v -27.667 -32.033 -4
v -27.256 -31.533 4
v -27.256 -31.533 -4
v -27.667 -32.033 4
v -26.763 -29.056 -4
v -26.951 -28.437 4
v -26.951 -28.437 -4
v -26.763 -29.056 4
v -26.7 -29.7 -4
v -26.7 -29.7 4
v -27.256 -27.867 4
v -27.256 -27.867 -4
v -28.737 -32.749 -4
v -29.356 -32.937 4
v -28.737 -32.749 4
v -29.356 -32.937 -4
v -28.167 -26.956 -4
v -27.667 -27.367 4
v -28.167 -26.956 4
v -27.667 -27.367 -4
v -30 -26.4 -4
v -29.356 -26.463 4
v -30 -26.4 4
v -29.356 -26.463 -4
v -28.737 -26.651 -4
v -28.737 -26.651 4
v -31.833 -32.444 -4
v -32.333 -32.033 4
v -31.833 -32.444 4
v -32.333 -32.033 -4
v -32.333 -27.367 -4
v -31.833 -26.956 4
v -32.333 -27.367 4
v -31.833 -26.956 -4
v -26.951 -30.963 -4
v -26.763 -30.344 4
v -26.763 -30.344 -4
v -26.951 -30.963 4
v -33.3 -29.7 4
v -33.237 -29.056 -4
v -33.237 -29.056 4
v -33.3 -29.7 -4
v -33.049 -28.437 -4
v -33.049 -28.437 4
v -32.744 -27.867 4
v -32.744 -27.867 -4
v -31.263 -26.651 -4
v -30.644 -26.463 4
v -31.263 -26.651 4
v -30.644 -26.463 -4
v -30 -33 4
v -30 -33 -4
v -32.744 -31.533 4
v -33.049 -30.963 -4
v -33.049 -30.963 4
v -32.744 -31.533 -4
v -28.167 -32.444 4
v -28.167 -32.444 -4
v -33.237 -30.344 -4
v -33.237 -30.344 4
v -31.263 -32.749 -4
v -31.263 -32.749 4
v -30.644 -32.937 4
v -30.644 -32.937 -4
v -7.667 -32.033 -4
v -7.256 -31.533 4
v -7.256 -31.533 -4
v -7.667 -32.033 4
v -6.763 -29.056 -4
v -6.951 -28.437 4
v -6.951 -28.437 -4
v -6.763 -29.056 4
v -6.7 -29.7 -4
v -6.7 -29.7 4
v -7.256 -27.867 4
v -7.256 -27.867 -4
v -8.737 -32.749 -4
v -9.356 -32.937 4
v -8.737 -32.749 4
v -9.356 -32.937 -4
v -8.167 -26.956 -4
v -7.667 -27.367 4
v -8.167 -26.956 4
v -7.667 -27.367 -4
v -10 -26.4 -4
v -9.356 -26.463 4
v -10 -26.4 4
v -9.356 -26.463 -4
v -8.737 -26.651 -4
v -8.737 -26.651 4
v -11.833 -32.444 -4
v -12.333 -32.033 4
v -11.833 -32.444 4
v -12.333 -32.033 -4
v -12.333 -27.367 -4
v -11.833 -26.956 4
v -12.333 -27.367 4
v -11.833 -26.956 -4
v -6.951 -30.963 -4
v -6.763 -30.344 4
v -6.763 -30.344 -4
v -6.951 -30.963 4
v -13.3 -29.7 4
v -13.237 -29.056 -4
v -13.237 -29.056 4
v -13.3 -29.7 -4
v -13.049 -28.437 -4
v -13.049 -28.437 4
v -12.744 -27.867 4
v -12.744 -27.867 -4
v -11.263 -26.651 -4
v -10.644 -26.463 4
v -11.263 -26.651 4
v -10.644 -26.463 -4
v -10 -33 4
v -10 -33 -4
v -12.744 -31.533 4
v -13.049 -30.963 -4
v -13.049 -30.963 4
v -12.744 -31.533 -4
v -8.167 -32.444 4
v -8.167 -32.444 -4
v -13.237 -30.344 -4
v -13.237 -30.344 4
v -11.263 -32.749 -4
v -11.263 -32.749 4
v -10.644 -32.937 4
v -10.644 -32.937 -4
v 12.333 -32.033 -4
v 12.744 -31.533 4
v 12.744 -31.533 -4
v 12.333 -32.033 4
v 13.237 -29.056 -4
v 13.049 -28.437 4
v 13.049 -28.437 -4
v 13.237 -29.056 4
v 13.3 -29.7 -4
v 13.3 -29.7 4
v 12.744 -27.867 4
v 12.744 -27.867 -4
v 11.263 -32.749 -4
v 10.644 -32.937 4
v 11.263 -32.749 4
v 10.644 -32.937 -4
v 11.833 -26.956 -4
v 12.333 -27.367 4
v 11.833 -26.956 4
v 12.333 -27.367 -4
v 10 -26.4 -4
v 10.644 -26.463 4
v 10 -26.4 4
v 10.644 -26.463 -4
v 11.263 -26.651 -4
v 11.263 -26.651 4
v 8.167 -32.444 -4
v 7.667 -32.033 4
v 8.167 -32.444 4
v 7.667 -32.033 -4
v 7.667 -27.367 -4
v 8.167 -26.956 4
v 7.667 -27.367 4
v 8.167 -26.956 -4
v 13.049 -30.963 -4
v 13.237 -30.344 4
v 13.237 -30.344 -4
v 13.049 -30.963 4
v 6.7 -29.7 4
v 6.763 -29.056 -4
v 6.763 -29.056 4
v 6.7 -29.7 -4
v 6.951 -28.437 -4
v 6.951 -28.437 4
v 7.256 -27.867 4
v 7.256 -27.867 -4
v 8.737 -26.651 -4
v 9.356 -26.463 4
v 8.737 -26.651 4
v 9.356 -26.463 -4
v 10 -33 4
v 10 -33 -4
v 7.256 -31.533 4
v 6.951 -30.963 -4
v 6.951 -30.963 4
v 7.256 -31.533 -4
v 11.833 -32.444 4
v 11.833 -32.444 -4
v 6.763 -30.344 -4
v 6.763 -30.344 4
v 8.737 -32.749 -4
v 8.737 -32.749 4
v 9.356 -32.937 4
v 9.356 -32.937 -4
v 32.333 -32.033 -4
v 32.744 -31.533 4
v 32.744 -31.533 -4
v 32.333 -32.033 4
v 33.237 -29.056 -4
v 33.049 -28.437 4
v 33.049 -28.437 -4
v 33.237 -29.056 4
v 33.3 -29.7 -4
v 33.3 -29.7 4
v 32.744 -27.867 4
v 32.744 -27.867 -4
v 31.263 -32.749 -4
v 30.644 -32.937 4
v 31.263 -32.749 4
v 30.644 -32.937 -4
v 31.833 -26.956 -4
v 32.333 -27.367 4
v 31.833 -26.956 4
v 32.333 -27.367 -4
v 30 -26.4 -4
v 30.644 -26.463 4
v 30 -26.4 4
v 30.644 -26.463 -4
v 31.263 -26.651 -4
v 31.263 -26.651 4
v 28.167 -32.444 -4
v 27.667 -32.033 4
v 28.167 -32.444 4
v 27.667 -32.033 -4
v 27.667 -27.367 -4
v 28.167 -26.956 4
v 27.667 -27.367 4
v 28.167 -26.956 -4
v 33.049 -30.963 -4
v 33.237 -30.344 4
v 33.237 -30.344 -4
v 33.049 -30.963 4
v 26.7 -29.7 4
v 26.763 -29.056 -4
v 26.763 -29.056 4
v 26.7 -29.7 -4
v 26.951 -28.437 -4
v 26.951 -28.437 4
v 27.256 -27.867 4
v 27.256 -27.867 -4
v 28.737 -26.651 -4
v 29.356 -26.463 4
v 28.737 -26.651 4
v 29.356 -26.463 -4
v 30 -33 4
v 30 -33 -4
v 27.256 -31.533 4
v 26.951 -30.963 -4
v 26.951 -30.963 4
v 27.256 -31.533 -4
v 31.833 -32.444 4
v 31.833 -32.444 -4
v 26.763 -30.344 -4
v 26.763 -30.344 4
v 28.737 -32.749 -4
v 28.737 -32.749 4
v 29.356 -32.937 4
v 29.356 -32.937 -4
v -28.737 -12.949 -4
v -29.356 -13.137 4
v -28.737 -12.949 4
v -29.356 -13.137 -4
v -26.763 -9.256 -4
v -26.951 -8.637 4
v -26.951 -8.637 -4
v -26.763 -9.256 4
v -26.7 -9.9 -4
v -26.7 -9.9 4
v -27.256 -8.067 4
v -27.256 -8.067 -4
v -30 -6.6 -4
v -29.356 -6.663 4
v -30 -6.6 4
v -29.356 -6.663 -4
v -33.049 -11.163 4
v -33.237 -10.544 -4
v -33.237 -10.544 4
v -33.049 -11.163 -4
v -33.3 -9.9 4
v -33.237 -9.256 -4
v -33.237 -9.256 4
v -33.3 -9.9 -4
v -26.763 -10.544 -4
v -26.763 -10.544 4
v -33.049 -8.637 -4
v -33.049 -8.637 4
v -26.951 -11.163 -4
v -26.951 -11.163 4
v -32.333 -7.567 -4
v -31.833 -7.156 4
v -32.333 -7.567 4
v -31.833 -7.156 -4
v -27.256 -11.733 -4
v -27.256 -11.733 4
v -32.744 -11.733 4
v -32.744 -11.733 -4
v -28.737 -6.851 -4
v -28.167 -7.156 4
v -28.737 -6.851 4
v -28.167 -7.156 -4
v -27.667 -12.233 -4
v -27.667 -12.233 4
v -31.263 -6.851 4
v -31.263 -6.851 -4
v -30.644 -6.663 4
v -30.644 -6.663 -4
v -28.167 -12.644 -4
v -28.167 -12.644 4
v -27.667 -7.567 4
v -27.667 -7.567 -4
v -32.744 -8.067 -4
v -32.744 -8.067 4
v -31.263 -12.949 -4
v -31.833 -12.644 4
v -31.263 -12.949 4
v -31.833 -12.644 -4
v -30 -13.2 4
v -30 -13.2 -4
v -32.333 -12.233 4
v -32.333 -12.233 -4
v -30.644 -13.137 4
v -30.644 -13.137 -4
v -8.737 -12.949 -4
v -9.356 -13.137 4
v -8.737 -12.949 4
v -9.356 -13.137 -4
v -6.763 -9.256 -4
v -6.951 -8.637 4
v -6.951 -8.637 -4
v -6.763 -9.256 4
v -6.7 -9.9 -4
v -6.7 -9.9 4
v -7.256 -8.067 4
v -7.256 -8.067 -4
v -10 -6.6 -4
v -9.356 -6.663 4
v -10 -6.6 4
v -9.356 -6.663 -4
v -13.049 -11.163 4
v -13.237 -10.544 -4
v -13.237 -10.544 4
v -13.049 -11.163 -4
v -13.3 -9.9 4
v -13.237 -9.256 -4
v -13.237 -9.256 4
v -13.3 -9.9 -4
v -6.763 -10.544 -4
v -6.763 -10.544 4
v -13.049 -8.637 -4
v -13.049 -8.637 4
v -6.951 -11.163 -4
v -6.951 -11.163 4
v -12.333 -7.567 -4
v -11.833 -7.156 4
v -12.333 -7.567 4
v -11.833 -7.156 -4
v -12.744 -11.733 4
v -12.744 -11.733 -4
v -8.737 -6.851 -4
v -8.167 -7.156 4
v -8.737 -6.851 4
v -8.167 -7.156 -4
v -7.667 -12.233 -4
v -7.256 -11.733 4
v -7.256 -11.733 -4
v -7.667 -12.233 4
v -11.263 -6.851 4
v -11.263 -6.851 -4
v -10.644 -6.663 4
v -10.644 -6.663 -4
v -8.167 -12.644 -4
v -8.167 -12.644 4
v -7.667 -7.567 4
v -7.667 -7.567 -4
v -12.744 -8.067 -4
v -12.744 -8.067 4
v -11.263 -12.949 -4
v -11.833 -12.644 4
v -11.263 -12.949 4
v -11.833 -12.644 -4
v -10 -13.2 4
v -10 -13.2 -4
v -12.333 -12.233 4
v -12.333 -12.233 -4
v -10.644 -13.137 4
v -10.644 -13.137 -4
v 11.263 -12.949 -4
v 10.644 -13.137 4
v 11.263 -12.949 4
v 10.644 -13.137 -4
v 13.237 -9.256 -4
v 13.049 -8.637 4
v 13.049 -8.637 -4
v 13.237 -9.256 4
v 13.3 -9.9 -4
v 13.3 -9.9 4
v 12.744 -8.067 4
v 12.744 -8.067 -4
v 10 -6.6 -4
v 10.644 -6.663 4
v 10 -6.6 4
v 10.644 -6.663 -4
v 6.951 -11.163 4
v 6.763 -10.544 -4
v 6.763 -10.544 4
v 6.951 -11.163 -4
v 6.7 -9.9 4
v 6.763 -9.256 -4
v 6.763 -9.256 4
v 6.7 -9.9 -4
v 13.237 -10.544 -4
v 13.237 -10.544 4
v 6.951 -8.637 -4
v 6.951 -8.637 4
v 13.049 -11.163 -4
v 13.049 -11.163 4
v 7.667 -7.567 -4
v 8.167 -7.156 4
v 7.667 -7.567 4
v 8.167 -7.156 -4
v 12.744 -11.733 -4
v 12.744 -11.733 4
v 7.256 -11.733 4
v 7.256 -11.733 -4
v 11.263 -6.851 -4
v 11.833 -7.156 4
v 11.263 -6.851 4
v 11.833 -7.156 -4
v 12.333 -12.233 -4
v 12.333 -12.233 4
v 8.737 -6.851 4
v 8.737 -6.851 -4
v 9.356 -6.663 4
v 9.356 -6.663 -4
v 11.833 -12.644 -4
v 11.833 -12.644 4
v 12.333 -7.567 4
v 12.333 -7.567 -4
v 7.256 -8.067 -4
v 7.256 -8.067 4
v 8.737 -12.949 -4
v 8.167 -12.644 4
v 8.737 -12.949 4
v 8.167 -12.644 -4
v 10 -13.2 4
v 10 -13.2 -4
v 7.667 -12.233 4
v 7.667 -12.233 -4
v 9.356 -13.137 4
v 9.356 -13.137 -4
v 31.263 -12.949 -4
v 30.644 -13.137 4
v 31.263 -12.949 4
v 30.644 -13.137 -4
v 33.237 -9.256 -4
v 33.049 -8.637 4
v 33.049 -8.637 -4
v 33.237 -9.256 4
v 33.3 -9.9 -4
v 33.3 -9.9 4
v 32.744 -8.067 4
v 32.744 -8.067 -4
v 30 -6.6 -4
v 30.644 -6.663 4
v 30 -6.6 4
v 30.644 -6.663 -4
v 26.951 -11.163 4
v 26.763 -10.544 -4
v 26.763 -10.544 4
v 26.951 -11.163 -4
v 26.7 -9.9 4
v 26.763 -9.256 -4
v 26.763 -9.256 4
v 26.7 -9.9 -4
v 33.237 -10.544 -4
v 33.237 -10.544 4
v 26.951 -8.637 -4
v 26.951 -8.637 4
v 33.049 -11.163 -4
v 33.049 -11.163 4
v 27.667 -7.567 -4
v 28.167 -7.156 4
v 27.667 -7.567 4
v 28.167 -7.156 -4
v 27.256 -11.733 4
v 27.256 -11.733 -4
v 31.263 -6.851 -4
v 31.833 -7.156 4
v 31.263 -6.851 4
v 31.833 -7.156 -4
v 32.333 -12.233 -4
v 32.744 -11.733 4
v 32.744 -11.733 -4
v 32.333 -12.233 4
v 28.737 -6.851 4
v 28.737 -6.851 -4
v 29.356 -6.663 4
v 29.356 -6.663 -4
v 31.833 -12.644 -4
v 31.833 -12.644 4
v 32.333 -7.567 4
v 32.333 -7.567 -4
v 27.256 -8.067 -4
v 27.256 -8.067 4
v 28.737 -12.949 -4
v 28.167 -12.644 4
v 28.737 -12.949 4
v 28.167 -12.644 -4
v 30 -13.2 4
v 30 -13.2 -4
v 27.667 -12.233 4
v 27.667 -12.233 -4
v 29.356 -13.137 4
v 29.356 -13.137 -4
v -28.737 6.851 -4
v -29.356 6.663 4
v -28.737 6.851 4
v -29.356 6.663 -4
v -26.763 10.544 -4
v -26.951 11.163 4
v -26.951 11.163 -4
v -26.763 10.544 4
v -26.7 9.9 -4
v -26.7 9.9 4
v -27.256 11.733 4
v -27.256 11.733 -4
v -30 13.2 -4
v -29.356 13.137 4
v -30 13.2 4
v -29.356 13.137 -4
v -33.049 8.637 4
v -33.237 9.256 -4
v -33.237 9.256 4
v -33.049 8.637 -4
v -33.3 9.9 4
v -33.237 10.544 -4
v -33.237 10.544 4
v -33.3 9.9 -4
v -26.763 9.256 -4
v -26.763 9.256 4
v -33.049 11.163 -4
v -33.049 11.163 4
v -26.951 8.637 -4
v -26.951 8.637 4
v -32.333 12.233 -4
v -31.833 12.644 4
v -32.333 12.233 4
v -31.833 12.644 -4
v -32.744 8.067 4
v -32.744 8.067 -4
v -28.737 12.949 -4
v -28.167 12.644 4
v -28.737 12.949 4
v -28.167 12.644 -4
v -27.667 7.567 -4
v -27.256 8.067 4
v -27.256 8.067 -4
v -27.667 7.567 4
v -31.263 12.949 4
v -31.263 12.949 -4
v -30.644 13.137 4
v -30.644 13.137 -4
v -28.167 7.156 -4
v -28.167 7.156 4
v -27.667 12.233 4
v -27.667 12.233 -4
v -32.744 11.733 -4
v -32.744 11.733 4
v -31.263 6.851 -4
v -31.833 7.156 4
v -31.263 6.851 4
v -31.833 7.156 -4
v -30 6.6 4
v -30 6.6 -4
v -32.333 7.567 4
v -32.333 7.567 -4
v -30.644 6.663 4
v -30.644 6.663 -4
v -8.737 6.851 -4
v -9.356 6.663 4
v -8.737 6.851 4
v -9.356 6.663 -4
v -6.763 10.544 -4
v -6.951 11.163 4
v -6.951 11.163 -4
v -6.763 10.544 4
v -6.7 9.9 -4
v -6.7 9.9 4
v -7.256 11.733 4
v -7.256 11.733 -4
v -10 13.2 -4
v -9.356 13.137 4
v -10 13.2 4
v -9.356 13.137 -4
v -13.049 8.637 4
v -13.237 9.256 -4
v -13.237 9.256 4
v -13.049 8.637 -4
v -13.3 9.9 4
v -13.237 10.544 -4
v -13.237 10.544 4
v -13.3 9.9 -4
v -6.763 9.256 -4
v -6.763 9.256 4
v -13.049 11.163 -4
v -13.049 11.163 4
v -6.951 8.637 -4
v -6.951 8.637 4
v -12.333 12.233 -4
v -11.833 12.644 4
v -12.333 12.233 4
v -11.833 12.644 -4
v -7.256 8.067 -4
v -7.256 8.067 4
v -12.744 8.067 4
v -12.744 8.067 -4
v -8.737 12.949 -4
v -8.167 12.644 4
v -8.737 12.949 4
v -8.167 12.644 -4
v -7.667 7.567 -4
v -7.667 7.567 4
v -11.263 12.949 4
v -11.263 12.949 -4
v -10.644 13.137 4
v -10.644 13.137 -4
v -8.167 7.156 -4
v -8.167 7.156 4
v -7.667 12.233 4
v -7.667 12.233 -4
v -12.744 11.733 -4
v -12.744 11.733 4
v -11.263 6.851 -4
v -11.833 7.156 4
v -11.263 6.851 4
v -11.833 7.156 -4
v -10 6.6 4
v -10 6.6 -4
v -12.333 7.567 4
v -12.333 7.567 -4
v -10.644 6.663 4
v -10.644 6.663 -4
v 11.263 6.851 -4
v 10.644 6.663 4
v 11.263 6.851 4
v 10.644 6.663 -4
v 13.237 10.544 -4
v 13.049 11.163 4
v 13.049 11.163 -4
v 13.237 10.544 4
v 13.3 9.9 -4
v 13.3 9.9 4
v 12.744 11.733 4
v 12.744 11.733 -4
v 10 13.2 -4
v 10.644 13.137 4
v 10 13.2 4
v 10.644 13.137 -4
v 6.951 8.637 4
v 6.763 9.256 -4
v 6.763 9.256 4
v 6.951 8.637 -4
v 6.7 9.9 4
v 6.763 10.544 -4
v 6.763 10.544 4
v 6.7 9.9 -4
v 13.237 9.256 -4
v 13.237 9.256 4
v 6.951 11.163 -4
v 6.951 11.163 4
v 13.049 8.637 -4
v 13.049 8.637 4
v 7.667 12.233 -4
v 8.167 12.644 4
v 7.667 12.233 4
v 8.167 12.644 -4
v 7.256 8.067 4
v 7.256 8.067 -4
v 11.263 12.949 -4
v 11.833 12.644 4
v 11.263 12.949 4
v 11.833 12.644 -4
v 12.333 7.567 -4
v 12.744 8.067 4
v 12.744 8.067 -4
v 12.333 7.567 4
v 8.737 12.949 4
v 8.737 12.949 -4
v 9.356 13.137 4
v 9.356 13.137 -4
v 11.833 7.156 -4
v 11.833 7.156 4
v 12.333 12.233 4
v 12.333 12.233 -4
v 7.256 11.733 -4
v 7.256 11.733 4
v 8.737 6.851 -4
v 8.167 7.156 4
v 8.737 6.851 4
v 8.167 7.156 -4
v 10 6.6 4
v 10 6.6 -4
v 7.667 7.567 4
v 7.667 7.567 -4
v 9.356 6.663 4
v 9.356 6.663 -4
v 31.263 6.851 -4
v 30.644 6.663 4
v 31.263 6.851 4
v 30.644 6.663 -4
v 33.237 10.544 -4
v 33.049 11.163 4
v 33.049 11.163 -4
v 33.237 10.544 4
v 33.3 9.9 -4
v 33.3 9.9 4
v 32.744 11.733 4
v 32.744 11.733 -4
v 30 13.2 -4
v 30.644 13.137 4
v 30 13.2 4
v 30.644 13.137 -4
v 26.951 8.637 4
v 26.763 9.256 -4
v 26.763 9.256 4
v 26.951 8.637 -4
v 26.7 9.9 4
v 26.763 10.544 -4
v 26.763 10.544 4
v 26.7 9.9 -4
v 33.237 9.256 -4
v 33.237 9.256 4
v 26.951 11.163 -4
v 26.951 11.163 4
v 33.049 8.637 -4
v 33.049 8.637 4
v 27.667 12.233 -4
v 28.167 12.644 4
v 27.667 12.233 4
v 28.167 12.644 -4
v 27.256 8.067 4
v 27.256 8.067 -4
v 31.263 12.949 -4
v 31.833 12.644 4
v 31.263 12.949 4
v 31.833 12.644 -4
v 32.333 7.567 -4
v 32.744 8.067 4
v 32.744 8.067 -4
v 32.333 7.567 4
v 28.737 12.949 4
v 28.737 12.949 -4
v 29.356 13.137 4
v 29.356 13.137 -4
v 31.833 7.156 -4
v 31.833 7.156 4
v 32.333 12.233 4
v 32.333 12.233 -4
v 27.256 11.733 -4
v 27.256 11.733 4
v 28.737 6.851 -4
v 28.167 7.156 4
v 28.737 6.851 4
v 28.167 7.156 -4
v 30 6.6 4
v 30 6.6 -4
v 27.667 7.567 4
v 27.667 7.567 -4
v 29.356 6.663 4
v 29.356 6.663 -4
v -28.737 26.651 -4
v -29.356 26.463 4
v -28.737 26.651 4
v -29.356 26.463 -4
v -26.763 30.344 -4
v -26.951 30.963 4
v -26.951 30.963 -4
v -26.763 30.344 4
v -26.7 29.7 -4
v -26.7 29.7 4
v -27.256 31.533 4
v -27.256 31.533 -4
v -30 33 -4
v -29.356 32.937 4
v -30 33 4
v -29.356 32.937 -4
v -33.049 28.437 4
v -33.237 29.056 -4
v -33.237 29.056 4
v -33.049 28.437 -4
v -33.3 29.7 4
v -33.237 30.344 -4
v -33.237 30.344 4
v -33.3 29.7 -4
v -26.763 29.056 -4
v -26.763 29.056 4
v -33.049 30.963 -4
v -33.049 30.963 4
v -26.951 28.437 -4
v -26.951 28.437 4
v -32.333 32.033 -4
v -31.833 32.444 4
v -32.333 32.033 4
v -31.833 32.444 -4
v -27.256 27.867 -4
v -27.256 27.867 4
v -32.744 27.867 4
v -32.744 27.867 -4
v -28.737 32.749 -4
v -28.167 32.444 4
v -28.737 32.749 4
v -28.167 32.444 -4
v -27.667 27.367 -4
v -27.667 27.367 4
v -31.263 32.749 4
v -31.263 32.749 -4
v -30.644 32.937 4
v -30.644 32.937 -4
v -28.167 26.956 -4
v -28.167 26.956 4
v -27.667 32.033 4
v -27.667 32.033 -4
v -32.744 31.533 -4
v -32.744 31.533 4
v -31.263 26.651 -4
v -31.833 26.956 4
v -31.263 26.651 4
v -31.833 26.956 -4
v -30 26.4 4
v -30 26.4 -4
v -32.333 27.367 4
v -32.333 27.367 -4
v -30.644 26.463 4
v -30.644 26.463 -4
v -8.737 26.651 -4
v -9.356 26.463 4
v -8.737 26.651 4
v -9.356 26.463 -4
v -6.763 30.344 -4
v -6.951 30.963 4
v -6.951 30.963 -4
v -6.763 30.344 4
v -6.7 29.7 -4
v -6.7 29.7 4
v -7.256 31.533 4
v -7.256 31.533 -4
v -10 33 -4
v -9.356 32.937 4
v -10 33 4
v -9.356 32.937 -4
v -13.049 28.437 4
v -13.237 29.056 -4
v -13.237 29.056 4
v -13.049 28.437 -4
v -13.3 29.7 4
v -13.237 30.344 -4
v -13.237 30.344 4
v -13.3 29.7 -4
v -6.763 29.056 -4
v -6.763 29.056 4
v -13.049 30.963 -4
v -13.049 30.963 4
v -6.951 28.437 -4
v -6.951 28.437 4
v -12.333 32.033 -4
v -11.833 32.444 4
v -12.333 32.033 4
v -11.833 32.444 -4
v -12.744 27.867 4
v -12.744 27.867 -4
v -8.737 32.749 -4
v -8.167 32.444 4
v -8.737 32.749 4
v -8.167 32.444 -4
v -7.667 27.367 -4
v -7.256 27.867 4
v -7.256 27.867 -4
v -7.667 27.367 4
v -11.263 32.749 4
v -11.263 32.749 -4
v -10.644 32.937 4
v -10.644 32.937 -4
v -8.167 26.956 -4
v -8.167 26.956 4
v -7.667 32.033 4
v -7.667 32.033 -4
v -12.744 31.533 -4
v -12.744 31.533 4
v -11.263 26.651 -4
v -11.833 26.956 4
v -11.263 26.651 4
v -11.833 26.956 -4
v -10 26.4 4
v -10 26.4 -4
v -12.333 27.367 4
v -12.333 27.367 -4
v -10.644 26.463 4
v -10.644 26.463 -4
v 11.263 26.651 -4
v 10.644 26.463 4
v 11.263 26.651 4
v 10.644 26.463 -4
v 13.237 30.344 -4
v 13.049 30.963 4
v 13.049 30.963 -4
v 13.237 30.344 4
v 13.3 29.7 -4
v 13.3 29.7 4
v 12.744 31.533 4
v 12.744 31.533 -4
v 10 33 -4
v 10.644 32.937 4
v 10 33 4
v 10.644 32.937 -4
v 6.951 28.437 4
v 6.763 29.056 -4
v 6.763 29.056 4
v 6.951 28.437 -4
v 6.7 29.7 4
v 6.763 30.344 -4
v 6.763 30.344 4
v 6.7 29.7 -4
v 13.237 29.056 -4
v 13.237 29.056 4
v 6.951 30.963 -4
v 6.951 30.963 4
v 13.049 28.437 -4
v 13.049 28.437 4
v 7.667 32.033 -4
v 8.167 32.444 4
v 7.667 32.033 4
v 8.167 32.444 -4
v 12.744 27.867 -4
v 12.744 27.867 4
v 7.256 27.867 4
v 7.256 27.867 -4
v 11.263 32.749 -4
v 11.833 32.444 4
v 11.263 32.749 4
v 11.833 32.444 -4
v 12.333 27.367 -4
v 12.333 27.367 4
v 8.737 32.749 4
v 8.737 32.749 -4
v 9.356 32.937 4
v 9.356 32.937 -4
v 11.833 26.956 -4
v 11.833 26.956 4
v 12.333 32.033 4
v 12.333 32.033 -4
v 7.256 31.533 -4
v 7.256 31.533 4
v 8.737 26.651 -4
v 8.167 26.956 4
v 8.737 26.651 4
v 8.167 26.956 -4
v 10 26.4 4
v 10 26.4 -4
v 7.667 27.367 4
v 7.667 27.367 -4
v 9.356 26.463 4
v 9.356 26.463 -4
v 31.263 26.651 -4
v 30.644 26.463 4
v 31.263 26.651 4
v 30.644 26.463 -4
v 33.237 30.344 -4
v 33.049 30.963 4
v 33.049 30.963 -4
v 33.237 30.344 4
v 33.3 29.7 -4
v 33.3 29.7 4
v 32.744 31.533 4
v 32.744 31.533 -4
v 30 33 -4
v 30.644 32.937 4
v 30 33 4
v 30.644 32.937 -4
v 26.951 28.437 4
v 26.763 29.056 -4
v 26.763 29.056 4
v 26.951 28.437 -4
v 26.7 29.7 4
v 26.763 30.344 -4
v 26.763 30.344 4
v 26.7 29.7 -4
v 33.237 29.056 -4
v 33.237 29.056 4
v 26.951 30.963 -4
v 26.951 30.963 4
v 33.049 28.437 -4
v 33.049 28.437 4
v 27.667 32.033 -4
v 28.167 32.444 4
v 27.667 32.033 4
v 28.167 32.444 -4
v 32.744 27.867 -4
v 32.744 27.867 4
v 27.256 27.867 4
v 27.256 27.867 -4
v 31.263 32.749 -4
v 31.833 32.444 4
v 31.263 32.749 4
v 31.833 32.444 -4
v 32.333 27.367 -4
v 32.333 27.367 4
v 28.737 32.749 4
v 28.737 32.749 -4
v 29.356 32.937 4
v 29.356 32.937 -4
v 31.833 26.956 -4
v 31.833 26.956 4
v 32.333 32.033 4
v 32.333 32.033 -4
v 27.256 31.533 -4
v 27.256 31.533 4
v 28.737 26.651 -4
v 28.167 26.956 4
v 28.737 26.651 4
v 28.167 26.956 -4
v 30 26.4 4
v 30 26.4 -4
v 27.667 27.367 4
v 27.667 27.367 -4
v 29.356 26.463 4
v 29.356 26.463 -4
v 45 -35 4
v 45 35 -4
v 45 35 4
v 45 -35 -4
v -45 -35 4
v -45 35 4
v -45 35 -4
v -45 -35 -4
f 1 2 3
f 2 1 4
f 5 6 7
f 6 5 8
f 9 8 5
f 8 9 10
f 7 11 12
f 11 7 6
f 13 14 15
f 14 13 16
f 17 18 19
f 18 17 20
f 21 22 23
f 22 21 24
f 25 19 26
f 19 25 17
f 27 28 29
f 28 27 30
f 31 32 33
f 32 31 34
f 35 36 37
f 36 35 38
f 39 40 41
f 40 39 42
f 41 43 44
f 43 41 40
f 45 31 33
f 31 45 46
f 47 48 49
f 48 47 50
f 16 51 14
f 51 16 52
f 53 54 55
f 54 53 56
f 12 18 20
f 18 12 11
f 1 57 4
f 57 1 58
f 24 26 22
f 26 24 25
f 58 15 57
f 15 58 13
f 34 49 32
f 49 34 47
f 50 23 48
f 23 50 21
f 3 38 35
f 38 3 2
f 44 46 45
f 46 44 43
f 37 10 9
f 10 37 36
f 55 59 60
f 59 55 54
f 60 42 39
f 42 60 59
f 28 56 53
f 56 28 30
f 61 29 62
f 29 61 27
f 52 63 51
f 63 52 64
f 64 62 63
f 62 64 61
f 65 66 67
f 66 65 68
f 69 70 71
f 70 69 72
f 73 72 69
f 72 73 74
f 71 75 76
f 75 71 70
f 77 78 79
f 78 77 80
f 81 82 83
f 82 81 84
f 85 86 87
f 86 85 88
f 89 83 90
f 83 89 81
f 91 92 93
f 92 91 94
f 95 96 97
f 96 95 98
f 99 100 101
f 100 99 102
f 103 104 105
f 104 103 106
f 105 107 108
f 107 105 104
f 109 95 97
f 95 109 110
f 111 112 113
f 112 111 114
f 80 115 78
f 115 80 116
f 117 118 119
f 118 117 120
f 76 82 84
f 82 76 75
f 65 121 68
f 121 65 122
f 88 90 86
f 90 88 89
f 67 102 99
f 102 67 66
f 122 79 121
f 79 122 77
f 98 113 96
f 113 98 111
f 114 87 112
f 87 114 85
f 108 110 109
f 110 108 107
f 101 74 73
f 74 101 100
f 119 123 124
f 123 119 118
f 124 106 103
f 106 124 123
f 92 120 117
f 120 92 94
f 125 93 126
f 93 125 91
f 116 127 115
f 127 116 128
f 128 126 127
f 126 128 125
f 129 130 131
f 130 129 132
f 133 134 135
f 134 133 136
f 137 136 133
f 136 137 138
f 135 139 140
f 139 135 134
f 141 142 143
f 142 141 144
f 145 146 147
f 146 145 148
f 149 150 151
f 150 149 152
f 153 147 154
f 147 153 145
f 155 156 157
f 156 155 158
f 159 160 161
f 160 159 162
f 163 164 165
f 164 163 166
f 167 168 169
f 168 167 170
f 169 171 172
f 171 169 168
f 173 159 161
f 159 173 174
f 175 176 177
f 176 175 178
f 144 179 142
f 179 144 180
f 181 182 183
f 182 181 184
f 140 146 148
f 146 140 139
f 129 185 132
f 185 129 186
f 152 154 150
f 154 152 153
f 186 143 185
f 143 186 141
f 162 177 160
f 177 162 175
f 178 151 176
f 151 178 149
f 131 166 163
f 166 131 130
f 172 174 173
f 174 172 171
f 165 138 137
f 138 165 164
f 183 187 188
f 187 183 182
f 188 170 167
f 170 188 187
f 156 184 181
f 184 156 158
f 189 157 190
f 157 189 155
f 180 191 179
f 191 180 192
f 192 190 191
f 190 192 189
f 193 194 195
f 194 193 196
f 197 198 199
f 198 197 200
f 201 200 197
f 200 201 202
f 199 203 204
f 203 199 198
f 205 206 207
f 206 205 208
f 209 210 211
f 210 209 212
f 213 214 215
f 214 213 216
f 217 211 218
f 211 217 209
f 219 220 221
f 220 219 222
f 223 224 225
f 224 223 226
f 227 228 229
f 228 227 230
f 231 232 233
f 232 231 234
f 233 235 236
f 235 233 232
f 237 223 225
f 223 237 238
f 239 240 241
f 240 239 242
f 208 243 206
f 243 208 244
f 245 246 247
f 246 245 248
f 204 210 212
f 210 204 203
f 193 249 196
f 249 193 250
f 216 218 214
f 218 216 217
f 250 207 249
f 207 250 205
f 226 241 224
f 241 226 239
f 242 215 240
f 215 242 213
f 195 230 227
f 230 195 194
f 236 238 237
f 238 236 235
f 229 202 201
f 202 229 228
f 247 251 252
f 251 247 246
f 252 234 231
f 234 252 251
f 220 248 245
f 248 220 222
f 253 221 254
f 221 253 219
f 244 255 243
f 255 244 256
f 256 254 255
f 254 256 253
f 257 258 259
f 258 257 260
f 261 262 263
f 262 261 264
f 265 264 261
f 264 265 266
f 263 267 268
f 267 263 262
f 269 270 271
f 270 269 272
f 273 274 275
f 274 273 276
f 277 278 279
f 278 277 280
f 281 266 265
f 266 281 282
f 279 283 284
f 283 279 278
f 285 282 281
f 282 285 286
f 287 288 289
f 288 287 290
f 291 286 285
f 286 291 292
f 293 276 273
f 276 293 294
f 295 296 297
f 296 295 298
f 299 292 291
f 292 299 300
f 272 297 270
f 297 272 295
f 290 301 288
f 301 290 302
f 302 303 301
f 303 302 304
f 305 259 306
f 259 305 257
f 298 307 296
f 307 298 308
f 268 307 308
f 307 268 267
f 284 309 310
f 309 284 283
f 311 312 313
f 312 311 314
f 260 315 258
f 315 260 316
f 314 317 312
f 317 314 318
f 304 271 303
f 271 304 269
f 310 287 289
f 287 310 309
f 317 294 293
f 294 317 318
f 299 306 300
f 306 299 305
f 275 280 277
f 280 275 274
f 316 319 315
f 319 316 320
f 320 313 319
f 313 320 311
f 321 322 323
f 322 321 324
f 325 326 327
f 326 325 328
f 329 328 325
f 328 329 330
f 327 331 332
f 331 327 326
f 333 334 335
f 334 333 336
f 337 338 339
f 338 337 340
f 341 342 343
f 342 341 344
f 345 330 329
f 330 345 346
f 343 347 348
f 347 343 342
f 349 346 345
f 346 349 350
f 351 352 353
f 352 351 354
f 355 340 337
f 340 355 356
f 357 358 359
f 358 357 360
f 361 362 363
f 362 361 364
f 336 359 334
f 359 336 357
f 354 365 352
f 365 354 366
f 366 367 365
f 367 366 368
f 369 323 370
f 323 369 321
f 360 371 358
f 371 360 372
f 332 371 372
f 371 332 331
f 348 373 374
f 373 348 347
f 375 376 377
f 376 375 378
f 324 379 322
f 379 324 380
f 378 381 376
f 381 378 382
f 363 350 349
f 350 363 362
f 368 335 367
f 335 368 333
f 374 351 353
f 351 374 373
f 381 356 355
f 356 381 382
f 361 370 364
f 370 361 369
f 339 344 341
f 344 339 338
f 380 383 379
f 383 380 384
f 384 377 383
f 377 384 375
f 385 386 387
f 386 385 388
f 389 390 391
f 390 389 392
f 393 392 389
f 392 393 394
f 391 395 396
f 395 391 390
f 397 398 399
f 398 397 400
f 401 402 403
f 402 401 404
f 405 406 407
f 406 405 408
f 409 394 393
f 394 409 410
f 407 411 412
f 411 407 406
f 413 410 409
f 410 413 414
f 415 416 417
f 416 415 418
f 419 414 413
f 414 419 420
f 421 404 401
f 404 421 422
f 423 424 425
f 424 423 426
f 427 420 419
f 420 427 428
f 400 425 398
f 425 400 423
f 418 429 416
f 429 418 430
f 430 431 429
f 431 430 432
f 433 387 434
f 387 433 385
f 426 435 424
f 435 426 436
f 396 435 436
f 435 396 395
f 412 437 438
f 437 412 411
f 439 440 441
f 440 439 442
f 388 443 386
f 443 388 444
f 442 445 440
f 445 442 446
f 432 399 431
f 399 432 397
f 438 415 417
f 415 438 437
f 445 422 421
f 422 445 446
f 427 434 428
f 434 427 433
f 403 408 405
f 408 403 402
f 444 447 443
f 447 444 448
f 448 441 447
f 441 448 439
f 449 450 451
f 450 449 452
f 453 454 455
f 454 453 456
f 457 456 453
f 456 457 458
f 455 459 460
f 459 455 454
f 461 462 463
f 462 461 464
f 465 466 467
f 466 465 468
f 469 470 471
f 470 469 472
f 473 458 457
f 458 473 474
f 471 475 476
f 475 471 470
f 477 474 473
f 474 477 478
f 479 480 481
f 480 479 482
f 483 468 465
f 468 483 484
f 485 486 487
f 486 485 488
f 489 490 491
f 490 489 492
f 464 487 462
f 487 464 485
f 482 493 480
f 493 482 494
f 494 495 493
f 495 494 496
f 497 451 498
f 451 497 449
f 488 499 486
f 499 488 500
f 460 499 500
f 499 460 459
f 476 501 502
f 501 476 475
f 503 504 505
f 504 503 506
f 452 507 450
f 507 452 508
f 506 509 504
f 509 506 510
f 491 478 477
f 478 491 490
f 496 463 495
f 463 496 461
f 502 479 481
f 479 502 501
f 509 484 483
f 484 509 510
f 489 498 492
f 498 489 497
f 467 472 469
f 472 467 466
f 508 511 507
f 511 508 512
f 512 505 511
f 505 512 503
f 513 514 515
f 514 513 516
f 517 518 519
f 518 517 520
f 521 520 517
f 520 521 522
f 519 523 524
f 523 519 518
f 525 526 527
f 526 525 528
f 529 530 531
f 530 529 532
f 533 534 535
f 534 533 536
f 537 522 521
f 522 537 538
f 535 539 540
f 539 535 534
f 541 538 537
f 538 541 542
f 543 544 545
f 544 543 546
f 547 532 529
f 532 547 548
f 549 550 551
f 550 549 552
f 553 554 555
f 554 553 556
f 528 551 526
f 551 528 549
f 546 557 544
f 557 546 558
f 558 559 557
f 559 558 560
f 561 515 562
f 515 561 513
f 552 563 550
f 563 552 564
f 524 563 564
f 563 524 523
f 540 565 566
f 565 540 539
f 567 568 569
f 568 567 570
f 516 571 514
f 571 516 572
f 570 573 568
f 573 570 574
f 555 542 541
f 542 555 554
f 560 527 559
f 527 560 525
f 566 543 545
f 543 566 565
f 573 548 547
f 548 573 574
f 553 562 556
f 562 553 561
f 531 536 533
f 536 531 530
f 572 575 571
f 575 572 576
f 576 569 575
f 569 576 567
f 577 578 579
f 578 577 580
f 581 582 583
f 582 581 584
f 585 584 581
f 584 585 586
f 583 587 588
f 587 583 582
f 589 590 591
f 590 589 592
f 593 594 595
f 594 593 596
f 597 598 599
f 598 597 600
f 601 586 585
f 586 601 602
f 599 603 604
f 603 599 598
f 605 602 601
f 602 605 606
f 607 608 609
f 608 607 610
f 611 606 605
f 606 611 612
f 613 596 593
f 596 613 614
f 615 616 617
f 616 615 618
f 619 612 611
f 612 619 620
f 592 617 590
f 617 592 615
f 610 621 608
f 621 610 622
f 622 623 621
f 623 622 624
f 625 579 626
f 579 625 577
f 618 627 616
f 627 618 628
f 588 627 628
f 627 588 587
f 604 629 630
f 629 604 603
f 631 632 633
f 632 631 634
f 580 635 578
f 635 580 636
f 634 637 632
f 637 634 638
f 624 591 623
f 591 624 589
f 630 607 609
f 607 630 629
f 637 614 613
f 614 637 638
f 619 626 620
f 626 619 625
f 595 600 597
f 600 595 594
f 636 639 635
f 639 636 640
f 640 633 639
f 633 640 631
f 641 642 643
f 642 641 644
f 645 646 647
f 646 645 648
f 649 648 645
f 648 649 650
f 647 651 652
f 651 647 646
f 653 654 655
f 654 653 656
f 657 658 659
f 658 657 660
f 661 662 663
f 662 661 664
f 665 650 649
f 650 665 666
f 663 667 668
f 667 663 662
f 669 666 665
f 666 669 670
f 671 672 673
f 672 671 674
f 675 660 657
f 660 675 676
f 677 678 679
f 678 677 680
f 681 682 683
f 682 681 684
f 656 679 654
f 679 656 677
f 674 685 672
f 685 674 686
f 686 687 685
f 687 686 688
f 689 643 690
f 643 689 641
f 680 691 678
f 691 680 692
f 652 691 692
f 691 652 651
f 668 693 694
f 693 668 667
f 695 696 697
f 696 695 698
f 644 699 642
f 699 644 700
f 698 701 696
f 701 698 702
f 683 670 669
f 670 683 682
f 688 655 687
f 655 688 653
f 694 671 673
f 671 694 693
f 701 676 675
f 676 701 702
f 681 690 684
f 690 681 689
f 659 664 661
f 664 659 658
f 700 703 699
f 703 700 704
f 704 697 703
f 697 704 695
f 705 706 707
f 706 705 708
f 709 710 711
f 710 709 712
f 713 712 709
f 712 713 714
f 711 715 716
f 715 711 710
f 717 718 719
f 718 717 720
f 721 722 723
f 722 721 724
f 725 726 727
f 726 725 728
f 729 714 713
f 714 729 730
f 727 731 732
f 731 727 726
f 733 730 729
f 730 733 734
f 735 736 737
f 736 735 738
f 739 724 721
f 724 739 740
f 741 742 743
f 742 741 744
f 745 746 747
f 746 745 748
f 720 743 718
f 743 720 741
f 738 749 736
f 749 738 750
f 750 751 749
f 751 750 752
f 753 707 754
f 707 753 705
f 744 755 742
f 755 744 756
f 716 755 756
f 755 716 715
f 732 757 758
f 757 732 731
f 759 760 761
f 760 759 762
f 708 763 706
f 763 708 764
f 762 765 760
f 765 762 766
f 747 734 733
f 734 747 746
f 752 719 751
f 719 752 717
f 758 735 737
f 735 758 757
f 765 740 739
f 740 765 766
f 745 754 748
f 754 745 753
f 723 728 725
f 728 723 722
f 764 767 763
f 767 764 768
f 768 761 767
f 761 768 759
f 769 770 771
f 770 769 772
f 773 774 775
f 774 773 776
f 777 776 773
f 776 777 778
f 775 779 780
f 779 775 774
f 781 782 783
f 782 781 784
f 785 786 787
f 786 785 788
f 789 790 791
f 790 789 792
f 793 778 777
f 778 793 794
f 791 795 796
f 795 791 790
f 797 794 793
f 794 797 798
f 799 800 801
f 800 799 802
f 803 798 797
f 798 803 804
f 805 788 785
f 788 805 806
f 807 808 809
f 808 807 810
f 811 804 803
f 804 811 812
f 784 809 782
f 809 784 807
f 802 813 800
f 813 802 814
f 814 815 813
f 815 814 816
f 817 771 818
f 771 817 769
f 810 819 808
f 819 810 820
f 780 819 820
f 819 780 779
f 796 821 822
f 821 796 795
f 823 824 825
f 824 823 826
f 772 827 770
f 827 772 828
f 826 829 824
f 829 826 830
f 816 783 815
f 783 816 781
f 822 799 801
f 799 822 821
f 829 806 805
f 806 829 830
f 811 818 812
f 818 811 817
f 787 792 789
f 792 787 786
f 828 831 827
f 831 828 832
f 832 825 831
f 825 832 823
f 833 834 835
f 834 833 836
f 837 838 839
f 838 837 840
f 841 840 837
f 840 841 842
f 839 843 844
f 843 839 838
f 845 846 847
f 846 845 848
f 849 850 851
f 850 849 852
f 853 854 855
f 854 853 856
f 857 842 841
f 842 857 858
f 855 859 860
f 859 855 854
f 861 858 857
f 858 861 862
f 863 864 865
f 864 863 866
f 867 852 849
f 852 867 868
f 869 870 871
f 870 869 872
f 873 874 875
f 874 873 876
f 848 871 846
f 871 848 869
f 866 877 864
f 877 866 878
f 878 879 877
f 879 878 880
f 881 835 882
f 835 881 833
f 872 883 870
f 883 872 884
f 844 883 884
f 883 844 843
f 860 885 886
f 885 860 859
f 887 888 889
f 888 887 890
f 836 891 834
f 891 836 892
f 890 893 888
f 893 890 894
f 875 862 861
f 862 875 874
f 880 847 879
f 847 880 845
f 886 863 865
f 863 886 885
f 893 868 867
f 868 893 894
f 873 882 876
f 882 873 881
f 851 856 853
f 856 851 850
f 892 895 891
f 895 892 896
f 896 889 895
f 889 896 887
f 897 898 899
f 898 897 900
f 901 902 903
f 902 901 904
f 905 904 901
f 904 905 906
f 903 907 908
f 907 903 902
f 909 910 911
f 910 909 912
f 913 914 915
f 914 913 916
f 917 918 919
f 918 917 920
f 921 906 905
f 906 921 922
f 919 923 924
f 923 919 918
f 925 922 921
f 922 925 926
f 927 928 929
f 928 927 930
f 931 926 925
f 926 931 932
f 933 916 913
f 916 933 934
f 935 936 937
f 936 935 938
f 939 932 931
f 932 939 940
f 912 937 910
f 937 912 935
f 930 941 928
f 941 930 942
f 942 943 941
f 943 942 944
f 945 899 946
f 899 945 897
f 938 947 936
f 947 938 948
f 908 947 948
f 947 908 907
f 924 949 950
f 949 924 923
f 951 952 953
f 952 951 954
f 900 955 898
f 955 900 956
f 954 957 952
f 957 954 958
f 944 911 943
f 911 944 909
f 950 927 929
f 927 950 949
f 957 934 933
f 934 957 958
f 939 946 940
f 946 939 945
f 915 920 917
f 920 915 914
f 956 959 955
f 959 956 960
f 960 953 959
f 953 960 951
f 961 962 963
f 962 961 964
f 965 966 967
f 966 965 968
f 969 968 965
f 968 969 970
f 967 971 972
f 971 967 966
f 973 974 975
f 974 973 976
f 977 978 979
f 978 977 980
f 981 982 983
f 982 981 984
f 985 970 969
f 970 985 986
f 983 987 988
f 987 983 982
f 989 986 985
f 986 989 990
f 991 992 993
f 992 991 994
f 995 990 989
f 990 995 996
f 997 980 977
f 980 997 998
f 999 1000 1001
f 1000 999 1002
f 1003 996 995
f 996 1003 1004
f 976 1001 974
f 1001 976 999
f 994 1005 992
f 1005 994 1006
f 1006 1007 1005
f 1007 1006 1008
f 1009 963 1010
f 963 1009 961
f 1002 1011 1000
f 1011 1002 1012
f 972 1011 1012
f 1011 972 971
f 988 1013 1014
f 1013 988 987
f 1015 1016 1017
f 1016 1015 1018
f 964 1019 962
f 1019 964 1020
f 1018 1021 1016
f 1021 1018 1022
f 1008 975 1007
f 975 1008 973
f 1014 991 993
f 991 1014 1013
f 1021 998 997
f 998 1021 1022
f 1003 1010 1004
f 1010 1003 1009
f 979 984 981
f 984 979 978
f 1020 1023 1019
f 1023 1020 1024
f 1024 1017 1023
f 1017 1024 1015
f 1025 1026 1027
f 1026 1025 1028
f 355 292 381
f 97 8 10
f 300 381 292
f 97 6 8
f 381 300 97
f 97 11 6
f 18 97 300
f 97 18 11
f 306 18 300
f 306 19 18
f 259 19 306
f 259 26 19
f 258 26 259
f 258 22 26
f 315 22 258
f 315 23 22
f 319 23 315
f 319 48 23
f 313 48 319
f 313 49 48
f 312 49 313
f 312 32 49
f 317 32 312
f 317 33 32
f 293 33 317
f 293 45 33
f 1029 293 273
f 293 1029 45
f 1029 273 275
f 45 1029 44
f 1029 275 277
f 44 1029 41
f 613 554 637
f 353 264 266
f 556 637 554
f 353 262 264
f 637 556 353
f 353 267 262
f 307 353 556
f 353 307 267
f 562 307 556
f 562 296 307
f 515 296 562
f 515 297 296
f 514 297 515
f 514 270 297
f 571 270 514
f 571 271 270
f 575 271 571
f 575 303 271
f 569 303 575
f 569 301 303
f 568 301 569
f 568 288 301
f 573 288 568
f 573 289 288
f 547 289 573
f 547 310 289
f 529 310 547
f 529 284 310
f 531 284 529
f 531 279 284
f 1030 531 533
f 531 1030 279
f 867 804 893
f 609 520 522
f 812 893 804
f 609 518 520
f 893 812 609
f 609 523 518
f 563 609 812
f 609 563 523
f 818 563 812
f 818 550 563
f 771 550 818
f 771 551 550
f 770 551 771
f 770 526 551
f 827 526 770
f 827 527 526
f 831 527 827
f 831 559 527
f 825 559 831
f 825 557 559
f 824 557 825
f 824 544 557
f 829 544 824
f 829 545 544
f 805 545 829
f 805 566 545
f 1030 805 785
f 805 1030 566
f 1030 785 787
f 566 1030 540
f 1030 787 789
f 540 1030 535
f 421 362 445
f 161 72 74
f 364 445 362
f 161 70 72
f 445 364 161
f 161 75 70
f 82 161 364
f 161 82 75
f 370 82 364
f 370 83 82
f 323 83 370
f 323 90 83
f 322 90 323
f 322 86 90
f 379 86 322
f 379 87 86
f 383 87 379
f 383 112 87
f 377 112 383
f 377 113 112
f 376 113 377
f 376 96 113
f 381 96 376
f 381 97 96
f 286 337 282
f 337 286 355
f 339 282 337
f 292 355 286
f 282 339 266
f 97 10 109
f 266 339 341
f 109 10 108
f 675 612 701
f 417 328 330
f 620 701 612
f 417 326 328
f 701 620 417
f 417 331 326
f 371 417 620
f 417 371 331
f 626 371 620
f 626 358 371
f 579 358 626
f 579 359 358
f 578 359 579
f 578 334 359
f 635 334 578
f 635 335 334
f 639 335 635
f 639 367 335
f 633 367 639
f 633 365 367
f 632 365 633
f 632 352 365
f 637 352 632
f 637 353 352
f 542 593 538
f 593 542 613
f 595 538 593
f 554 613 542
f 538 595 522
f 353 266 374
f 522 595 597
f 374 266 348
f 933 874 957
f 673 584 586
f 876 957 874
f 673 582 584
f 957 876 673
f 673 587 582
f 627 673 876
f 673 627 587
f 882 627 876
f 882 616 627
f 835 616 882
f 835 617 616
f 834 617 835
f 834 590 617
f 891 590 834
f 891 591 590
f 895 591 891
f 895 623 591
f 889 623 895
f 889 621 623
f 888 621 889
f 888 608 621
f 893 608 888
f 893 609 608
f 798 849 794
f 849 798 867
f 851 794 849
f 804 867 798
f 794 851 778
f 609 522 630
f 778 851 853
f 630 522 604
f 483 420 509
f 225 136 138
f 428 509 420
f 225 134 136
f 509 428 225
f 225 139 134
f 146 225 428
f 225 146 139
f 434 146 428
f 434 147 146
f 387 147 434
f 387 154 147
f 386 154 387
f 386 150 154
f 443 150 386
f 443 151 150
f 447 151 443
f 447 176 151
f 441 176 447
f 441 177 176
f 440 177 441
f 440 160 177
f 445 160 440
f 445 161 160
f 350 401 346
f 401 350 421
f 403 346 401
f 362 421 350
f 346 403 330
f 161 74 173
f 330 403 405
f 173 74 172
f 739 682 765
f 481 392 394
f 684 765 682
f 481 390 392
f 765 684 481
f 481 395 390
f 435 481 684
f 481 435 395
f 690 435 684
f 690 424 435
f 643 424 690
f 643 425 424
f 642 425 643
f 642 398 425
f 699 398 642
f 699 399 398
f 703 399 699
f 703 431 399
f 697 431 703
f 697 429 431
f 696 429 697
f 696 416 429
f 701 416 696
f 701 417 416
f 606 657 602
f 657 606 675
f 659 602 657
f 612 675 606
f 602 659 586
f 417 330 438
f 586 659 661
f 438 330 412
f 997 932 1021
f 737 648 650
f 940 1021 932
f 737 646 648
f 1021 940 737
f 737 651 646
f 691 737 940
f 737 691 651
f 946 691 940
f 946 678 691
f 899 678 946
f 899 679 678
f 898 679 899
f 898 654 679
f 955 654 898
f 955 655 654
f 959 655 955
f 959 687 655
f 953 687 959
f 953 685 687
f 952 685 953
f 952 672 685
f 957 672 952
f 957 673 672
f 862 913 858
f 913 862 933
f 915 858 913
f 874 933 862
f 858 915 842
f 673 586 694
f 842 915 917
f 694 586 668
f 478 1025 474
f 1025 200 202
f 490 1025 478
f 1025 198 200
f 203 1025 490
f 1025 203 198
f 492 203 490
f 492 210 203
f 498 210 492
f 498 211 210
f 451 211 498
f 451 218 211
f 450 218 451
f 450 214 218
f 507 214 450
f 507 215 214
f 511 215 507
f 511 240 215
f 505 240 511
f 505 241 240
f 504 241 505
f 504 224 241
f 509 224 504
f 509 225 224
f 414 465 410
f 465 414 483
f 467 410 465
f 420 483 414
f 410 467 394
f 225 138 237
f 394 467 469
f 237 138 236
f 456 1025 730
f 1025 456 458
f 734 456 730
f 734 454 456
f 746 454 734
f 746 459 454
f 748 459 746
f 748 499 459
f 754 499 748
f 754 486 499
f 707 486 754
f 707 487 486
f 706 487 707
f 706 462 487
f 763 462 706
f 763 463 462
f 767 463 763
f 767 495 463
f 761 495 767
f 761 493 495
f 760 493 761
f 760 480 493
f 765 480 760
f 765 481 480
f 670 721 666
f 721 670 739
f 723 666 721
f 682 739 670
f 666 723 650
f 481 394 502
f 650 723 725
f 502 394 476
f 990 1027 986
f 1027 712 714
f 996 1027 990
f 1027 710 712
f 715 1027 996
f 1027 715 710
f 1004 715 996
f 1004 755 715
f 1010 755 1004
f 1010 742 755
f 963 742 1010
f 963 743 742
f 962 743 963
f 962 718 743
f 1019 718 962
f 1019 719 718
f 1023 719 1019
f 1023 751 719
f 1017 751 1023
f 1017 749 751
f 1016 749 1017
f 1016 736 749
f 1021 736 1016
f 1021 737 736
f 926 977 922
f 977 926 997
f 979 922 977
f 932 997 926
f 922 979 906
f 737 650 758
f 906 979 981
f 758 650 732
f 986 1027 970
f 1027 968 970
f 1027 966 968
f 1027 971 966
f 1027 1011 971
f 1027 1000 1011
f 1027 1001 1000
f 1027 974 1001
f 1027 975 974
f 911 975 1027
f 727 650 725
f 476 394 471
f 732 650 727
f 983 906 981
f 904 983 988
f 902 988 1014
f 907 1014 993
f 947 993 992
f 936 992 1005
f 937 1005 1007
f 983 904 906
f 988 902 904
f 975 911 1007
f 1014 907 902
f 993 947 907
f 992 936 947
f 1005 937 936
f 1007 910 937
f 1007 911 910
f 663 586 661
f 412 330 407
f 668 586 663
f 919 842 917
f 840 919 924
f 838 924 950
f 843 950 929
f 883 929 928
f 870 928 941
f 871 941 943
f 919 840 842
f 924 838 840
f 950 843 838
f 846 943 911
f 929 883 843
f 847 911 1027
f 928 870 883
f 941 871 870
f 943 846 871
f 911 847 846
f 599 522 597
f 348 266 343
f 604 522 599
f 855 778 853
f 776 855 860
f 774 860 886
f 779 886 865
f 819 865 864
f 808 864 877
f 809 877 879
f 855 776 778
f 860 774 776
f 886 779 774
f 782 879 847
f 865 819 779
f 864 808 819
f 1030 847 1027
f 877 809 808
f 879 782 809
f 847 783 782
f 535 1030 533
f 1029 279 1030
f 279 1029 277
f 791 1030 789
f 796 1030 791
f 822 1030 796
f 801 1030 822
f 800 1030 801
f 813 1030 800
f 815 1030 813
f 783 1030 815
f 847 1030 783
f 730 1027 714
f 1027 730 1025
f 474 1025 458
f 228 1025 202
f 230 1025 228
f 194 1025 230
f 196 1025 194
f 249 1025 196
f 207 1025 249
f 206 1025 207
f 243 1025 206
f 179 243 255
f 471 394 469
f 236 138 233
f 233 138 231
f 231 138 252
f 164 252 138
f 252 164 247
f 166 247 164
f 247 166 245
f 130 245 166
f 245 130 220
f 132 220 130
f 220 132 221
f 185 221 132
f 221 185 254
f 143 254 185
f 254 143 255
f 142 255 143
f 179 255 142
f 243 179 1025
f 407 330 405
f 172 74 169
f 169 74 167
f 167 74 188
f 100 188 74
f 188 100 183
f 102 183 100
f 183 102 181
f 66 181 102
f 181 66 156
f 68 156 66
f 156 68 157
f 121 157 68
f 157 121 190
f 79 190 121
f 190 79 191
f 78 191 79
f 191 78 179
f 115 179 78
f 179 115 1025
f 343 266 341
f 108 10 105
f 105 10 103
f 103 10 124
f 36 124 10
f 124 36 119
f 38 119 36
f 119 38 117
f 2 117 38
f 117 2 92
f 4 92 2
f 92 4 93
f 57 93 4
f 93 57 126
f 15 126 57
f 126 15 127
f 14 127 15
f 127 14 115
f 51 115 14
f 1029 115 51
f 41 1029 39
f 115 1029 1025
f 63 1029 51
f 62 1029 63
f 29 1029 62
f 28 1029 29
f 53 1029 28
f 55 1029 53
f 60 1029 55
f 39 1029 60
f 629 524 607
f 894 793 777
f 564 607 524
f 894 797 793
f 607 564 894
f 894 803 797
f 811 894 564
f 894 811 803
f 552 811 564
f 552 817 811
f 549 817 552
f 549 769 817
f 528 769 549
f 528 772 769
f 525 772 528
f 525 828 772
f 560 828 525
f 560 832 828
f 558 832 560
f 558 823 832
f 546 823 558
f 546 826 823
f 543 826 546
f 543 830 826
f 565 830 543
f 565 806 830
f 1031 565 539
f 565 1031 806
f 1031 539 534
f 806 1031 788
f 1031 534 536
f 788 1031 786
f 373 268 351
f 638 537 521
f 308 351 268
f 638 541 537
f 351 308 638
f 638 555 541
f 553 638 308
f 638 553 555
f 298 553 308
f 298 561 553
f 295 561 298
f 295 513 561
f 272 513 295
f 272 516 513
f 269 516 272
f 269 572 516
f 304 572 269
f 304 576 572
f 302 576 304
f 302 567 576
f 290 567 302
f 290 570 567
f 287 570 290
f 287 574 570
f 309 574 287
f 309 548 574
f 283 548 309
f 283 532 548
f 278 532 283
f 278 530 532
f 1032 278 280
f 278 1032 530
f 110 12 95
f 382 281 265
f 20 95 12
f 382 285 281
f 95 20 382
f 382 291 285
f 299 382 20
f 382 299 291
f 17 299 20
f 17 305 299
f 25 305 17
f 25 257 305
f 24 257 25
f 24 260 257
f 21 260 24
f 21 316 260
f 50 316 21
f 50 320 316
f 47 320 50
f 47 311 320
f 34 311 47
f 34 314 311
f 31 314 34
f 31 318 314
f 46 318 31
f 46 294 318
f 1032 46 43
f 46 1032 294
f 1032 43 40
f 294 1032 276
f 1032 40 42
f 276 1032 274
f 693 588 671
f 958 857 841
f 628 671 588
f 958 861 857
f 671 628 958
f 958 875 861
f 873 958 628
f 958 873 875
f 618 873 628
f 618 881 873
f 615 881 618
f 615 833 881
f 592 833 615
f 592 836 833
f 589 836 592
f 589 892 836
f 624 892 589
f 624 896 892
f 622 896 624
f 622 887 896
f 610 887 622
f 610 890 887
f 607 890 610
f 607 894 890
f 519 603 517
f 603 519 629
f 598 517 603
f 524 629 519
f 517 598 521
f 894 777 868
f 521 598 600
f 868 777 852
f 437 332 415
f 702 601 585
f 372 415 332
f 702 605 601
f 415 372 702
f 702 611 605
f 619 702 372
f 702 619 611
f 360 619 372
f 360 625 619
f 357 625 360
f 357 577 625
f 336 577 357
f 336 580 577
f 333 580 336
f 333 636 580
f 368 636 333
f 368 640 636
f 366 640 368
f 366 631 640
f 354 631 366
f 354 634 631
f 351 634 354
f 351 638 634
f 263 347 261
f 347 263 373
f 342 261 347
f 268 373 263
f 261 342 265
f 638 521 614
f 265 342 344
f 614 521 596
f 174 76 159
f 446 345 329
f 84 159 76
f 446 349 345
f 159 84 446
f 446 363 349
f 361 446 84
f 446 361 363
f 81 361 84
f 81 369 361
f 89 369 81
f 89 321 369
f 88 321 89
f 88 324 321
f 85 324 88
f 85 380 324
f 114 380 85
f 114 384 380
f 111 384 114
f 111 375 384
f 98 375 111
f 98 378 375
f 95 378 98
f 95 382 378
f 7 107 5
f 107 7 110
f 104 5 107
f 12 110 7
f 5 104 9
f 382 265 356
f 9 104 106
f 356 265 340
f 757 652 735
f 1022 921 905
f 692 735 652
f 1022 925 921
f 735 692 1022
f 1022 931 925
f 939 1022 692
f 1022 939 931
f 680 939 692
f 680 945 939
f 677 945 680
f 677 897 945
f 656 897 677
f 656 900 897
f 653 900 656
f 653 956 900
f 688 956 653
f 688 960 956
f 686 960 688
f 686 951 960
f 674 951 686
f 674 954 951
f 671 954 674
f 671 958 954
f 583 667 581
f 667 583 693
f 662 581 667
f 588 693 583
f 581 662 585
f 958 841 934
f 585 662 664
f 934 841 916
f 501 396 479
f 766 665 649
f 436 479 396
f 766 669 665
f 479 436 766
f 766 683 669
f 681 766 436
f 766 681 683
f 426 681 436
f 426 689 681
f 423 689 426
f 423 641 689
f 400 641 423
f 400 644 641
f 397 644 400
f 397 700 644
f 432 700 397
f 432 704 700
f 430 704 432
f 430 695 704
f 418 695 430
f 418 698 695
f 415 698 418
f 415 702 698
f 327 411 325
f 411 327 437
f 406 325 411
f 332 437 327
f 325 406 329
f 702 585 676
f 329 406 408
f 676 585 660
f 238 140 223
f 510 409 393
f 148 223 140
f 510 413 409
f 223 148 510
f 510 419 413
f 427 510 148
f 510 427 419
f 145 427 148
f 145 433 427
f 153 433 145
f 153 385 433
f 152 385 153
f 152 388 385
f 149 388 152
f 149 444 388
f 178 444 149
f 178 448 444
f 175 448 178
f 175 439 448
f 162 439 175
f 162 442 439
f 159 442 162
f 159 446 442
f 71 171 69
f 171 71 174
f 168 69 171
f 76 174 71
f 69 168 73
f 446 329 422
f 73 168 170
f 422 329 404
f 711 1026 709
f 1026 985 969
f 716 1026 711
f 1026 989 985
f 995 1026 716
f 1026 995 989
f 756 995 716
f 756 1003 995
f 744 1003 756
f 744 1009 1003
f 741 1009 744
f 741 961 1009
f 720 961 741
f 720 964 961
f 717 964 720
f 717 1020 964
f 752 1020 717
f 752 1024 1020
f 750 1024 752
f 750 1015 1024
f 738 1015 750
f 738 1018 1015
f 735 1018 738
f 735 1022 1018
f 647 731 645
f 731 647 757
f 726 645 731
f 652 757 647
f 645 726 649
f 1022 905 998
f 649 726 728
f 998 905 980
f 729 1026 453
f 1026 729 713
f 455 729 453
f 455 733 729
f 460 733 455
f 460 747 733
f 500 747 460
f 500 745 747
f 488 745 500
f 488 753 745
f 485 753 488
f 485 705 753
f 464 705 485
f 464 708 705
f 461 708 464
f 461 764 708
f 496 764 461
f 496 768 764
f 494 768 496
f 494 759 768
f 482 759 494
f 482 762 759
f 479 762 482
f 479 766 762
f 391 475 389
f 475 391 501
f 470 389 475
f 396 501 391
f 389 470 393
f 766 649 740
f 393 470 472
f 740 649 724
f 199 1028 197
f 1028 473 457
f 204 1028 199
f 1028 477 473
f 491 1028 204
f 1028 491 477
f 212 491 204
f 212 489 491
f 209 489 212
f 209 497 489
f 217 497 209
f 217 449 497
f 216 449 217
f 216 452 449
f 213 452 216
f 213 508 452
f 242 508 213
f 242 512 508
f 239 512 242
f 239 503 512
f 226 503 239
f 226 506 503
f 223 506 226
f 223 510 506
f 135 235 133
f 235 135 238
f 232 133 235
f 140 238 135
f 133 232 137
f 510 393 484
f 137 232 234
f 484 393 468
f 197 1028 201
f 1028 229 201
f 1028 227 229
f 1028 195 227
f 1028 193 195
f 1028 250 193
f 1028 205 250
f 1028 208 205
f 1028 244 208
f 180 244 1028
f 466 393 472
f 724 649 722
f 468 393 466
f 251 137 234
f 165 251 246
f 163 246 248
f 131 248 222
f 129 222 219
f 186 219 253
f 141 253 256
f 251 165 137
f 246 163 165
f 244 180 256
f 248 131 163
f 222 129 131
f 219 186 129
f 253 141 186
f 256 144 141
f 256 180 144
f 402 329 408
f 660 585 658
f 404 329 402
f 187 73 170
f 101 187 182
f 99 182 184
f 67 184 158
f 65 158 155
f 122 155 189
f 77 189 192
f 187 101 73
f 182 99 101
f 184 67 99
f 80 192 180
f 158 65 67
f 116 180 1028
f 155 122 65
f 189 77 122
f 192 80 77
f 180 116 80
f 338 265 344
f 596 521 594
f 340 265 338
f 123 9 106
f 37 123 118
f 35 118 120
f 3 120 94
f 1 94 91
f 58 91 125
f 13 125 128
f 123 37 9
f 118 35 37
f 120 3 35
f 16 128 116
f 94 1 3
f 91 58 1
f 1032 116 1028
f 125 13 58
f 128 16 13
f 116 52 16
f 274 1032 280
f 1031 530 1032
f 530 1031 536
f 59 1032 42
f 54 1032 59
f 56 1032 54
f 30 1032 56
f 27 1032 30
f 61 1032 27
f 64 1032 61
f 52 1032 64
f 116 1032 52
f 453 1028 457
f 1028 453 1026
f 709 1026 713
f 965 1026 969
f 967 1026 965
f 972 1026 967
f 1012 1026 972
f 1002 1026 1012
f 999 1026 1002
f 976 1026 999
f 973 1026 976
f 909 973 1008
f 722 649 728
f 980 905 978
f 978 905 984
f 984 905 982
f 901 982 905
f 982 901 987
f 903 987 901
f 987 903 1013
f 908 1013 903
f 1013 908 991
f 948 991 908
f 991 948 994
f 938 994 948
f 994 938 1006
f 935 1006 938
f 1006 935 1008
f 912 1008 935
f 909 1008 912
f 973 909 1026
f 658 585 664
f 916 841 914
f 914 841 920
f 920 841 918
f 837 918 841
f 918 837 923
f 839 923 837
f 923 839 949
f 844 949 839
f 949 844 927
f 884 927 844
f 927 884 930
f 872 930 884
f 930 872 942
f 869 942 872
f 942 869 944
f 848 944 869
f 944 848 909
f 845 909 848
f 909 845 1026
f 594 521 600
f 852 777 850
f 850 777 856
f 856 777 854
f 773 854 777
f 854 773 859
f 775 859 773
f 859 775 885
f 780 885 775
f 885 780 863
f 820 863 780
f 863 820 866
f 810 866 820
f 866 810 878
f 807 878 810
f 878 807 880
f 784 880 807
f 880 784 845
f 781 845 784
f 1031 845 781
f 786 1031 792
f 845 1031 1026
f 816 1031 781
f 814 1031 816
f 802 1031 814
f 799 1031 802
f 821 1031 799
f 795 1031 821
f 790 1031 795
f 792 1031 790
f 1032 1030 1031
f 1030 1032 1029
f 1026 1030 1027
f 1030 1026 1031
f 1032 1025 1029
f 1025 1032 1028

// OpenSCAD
$fn = 32;

// ----------------------------------------------------------------------
// Perforated panel 90 x 70 x 8
// 4 x 4 Ø6.6 holes, grid layout
// ----------------------------------------------------------------------

// --- parameters (mm) ---
panel = [90, 70, 8];  // overall size (x, y, z)
hole_d = 6.6;         // hole diameter
pitch_x = 20;         // hole pitch along X
pitch_y = 19.8;       // hole pitch along Y

// --- derived feature positions (mm) ---
margin = hole_d / 2 + 2;            // = 5.3   clearance from the panel edge
cols = floor((panel[0] - 2 * margin) / pitch_x) + 1;  // = 4   how many columns fit in X
rows = floor((panel[1] - 2 * margin) / pitch_y) + 1;  // = 4   how many rows fit in Y
span_x = (cols - 1) * pitch_x + 0;  // = 60   width of the field
span_y = (rows - 1) * pitch_y;      // = 59.4   height of the field
origin_x = -span_x / 2;             // = -30   X of the first hole
origin_y = -span_y / 2;             // = -29.7   Y of the first row
holes = rows * cols;                // = 16   holes in total
feature_centers = [
  [origin_x + 0 * pitch_x, origin_y + 0 * pitch_y],
  [origin_x + 1 * pitch_x, origin_y + 0 * pitch_y],
  [origin_x + 2 * pitch_x, origin_y + 0 * pitch_y],
  [origin_x + 3 * pitch_x, origin_y + 0 * pitch_y],
  [origin_x + 0 * pitch_x, origin_y + 1 * pitch_y],
  [origin_x + 1 * pitch_x, origin_y + 1 * pitch_y],
  [origin_x + 2 * pitch_x, origin_y + 1 * pitch_y],
  [origin_x + 3 * pitch_x, origin_y + 1 * pitch_y],
  [origin_x + 0 * pitch_x, origin_y + 2 * pitch_y],
  [origin_x + 1 * pitch_x, origin_y + 2 * pitch_y],
  [origin_x + 2 * pitch_x, origin_y + 2 * pitch_y],
  [origin_x + 3 * pitch_x, origin_y + 2 * pitch_y],
  [origin_x + 0 * pitch_x, origin_y + 3 * pitch_y],
  [origin_x + 1 * pitch_x, origin_y + 3 * pitch_y],
  [origin_x + 2 * pitch_x, origin_y + 3 * pitch_y],
  [origin_x + 3 * pitch_x, origin_y + 3 * pitch_y]
];   // hole centres, used verbatim by the cutter loop

// panel outline, every hole through
difference() {
  cube(panel, center = true);
  for (centre = feature_centers)
    translate([centre[0], centre[1], 0])
      cylinder(d = hole_d, h = panel[2] + 2, center = true);
}
